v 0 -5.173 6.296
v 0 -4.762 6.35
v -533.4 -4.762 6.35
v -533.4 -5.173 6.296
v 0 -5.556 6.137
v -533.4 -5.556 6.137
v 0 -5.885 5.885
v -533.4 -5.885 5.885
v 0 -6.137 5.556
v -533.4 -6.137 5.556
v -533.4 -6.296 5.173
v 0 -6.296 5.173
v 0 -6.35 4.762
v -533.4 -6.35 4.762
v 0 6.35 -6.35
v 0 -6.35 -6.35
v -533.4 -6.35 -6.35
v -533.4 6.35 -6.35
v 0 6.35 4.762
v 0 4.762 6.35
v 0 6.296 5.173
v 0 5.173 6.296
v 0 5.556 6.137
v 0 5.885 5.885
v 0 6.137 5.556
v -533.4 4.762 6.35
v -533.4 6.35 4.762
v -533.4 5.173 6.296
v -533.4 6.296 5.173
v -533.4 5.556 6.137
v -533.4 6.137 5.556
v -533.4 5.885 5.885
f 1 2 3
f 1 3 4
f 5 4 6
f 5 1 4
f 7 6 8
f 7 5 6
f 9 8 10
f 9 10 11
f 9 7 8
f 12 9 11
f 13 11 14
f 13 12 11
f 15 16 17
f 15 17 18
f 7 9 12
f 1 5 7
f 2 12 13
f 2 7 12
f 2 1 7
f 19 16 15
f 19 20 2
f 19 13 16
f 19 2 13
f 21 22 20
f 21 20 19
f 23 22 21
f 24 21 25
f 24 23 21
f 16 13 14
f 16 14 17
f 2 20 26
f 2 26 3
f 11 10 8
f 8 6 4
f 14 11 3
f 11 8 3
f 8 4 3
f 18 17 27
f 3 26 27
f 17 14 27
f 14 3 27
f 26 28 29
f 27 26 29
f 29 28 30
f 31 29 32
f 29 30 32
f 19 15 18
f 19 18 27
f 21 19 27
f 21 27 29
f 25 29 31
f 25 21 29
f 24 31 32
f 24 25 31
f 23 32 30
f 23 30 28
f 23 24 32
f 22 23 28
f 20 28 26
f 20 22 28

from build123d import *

# Parameters (mm, degrees)
F2_DEPTH = 533.4


# Not quite as in the source:
# - a variable given as a bare number and used for a length is read in inches; the dataset says mm whatever the document's units were


with BuildPart() as f2:
    # F1 (on Right) → F2 (new body)
    with BuildSketch(Plane.YZ):
        with BuildLine():
            Line((-6.35, -6.35), (6.35, -6.35))
            Line((6.35, -6.35), (6.35, 4.7625))
            ThreePointArc((6.35, 4.7625), (5.8850320151, 5.8850320151), (4.7625, 6.35))
            Line((4.7625, 6.35), (-4.7625, 6.35))
            ThreePointArc((-4.7625, 6.35), (-5.8850320151, 5.8850320151), (-6.35, 4.7625))
            Line((-6.35, 4.7625), (-6.35, -6.35))
        make_face()
    extrude(amount=-F2_DEPTH)


solid = f2.part
